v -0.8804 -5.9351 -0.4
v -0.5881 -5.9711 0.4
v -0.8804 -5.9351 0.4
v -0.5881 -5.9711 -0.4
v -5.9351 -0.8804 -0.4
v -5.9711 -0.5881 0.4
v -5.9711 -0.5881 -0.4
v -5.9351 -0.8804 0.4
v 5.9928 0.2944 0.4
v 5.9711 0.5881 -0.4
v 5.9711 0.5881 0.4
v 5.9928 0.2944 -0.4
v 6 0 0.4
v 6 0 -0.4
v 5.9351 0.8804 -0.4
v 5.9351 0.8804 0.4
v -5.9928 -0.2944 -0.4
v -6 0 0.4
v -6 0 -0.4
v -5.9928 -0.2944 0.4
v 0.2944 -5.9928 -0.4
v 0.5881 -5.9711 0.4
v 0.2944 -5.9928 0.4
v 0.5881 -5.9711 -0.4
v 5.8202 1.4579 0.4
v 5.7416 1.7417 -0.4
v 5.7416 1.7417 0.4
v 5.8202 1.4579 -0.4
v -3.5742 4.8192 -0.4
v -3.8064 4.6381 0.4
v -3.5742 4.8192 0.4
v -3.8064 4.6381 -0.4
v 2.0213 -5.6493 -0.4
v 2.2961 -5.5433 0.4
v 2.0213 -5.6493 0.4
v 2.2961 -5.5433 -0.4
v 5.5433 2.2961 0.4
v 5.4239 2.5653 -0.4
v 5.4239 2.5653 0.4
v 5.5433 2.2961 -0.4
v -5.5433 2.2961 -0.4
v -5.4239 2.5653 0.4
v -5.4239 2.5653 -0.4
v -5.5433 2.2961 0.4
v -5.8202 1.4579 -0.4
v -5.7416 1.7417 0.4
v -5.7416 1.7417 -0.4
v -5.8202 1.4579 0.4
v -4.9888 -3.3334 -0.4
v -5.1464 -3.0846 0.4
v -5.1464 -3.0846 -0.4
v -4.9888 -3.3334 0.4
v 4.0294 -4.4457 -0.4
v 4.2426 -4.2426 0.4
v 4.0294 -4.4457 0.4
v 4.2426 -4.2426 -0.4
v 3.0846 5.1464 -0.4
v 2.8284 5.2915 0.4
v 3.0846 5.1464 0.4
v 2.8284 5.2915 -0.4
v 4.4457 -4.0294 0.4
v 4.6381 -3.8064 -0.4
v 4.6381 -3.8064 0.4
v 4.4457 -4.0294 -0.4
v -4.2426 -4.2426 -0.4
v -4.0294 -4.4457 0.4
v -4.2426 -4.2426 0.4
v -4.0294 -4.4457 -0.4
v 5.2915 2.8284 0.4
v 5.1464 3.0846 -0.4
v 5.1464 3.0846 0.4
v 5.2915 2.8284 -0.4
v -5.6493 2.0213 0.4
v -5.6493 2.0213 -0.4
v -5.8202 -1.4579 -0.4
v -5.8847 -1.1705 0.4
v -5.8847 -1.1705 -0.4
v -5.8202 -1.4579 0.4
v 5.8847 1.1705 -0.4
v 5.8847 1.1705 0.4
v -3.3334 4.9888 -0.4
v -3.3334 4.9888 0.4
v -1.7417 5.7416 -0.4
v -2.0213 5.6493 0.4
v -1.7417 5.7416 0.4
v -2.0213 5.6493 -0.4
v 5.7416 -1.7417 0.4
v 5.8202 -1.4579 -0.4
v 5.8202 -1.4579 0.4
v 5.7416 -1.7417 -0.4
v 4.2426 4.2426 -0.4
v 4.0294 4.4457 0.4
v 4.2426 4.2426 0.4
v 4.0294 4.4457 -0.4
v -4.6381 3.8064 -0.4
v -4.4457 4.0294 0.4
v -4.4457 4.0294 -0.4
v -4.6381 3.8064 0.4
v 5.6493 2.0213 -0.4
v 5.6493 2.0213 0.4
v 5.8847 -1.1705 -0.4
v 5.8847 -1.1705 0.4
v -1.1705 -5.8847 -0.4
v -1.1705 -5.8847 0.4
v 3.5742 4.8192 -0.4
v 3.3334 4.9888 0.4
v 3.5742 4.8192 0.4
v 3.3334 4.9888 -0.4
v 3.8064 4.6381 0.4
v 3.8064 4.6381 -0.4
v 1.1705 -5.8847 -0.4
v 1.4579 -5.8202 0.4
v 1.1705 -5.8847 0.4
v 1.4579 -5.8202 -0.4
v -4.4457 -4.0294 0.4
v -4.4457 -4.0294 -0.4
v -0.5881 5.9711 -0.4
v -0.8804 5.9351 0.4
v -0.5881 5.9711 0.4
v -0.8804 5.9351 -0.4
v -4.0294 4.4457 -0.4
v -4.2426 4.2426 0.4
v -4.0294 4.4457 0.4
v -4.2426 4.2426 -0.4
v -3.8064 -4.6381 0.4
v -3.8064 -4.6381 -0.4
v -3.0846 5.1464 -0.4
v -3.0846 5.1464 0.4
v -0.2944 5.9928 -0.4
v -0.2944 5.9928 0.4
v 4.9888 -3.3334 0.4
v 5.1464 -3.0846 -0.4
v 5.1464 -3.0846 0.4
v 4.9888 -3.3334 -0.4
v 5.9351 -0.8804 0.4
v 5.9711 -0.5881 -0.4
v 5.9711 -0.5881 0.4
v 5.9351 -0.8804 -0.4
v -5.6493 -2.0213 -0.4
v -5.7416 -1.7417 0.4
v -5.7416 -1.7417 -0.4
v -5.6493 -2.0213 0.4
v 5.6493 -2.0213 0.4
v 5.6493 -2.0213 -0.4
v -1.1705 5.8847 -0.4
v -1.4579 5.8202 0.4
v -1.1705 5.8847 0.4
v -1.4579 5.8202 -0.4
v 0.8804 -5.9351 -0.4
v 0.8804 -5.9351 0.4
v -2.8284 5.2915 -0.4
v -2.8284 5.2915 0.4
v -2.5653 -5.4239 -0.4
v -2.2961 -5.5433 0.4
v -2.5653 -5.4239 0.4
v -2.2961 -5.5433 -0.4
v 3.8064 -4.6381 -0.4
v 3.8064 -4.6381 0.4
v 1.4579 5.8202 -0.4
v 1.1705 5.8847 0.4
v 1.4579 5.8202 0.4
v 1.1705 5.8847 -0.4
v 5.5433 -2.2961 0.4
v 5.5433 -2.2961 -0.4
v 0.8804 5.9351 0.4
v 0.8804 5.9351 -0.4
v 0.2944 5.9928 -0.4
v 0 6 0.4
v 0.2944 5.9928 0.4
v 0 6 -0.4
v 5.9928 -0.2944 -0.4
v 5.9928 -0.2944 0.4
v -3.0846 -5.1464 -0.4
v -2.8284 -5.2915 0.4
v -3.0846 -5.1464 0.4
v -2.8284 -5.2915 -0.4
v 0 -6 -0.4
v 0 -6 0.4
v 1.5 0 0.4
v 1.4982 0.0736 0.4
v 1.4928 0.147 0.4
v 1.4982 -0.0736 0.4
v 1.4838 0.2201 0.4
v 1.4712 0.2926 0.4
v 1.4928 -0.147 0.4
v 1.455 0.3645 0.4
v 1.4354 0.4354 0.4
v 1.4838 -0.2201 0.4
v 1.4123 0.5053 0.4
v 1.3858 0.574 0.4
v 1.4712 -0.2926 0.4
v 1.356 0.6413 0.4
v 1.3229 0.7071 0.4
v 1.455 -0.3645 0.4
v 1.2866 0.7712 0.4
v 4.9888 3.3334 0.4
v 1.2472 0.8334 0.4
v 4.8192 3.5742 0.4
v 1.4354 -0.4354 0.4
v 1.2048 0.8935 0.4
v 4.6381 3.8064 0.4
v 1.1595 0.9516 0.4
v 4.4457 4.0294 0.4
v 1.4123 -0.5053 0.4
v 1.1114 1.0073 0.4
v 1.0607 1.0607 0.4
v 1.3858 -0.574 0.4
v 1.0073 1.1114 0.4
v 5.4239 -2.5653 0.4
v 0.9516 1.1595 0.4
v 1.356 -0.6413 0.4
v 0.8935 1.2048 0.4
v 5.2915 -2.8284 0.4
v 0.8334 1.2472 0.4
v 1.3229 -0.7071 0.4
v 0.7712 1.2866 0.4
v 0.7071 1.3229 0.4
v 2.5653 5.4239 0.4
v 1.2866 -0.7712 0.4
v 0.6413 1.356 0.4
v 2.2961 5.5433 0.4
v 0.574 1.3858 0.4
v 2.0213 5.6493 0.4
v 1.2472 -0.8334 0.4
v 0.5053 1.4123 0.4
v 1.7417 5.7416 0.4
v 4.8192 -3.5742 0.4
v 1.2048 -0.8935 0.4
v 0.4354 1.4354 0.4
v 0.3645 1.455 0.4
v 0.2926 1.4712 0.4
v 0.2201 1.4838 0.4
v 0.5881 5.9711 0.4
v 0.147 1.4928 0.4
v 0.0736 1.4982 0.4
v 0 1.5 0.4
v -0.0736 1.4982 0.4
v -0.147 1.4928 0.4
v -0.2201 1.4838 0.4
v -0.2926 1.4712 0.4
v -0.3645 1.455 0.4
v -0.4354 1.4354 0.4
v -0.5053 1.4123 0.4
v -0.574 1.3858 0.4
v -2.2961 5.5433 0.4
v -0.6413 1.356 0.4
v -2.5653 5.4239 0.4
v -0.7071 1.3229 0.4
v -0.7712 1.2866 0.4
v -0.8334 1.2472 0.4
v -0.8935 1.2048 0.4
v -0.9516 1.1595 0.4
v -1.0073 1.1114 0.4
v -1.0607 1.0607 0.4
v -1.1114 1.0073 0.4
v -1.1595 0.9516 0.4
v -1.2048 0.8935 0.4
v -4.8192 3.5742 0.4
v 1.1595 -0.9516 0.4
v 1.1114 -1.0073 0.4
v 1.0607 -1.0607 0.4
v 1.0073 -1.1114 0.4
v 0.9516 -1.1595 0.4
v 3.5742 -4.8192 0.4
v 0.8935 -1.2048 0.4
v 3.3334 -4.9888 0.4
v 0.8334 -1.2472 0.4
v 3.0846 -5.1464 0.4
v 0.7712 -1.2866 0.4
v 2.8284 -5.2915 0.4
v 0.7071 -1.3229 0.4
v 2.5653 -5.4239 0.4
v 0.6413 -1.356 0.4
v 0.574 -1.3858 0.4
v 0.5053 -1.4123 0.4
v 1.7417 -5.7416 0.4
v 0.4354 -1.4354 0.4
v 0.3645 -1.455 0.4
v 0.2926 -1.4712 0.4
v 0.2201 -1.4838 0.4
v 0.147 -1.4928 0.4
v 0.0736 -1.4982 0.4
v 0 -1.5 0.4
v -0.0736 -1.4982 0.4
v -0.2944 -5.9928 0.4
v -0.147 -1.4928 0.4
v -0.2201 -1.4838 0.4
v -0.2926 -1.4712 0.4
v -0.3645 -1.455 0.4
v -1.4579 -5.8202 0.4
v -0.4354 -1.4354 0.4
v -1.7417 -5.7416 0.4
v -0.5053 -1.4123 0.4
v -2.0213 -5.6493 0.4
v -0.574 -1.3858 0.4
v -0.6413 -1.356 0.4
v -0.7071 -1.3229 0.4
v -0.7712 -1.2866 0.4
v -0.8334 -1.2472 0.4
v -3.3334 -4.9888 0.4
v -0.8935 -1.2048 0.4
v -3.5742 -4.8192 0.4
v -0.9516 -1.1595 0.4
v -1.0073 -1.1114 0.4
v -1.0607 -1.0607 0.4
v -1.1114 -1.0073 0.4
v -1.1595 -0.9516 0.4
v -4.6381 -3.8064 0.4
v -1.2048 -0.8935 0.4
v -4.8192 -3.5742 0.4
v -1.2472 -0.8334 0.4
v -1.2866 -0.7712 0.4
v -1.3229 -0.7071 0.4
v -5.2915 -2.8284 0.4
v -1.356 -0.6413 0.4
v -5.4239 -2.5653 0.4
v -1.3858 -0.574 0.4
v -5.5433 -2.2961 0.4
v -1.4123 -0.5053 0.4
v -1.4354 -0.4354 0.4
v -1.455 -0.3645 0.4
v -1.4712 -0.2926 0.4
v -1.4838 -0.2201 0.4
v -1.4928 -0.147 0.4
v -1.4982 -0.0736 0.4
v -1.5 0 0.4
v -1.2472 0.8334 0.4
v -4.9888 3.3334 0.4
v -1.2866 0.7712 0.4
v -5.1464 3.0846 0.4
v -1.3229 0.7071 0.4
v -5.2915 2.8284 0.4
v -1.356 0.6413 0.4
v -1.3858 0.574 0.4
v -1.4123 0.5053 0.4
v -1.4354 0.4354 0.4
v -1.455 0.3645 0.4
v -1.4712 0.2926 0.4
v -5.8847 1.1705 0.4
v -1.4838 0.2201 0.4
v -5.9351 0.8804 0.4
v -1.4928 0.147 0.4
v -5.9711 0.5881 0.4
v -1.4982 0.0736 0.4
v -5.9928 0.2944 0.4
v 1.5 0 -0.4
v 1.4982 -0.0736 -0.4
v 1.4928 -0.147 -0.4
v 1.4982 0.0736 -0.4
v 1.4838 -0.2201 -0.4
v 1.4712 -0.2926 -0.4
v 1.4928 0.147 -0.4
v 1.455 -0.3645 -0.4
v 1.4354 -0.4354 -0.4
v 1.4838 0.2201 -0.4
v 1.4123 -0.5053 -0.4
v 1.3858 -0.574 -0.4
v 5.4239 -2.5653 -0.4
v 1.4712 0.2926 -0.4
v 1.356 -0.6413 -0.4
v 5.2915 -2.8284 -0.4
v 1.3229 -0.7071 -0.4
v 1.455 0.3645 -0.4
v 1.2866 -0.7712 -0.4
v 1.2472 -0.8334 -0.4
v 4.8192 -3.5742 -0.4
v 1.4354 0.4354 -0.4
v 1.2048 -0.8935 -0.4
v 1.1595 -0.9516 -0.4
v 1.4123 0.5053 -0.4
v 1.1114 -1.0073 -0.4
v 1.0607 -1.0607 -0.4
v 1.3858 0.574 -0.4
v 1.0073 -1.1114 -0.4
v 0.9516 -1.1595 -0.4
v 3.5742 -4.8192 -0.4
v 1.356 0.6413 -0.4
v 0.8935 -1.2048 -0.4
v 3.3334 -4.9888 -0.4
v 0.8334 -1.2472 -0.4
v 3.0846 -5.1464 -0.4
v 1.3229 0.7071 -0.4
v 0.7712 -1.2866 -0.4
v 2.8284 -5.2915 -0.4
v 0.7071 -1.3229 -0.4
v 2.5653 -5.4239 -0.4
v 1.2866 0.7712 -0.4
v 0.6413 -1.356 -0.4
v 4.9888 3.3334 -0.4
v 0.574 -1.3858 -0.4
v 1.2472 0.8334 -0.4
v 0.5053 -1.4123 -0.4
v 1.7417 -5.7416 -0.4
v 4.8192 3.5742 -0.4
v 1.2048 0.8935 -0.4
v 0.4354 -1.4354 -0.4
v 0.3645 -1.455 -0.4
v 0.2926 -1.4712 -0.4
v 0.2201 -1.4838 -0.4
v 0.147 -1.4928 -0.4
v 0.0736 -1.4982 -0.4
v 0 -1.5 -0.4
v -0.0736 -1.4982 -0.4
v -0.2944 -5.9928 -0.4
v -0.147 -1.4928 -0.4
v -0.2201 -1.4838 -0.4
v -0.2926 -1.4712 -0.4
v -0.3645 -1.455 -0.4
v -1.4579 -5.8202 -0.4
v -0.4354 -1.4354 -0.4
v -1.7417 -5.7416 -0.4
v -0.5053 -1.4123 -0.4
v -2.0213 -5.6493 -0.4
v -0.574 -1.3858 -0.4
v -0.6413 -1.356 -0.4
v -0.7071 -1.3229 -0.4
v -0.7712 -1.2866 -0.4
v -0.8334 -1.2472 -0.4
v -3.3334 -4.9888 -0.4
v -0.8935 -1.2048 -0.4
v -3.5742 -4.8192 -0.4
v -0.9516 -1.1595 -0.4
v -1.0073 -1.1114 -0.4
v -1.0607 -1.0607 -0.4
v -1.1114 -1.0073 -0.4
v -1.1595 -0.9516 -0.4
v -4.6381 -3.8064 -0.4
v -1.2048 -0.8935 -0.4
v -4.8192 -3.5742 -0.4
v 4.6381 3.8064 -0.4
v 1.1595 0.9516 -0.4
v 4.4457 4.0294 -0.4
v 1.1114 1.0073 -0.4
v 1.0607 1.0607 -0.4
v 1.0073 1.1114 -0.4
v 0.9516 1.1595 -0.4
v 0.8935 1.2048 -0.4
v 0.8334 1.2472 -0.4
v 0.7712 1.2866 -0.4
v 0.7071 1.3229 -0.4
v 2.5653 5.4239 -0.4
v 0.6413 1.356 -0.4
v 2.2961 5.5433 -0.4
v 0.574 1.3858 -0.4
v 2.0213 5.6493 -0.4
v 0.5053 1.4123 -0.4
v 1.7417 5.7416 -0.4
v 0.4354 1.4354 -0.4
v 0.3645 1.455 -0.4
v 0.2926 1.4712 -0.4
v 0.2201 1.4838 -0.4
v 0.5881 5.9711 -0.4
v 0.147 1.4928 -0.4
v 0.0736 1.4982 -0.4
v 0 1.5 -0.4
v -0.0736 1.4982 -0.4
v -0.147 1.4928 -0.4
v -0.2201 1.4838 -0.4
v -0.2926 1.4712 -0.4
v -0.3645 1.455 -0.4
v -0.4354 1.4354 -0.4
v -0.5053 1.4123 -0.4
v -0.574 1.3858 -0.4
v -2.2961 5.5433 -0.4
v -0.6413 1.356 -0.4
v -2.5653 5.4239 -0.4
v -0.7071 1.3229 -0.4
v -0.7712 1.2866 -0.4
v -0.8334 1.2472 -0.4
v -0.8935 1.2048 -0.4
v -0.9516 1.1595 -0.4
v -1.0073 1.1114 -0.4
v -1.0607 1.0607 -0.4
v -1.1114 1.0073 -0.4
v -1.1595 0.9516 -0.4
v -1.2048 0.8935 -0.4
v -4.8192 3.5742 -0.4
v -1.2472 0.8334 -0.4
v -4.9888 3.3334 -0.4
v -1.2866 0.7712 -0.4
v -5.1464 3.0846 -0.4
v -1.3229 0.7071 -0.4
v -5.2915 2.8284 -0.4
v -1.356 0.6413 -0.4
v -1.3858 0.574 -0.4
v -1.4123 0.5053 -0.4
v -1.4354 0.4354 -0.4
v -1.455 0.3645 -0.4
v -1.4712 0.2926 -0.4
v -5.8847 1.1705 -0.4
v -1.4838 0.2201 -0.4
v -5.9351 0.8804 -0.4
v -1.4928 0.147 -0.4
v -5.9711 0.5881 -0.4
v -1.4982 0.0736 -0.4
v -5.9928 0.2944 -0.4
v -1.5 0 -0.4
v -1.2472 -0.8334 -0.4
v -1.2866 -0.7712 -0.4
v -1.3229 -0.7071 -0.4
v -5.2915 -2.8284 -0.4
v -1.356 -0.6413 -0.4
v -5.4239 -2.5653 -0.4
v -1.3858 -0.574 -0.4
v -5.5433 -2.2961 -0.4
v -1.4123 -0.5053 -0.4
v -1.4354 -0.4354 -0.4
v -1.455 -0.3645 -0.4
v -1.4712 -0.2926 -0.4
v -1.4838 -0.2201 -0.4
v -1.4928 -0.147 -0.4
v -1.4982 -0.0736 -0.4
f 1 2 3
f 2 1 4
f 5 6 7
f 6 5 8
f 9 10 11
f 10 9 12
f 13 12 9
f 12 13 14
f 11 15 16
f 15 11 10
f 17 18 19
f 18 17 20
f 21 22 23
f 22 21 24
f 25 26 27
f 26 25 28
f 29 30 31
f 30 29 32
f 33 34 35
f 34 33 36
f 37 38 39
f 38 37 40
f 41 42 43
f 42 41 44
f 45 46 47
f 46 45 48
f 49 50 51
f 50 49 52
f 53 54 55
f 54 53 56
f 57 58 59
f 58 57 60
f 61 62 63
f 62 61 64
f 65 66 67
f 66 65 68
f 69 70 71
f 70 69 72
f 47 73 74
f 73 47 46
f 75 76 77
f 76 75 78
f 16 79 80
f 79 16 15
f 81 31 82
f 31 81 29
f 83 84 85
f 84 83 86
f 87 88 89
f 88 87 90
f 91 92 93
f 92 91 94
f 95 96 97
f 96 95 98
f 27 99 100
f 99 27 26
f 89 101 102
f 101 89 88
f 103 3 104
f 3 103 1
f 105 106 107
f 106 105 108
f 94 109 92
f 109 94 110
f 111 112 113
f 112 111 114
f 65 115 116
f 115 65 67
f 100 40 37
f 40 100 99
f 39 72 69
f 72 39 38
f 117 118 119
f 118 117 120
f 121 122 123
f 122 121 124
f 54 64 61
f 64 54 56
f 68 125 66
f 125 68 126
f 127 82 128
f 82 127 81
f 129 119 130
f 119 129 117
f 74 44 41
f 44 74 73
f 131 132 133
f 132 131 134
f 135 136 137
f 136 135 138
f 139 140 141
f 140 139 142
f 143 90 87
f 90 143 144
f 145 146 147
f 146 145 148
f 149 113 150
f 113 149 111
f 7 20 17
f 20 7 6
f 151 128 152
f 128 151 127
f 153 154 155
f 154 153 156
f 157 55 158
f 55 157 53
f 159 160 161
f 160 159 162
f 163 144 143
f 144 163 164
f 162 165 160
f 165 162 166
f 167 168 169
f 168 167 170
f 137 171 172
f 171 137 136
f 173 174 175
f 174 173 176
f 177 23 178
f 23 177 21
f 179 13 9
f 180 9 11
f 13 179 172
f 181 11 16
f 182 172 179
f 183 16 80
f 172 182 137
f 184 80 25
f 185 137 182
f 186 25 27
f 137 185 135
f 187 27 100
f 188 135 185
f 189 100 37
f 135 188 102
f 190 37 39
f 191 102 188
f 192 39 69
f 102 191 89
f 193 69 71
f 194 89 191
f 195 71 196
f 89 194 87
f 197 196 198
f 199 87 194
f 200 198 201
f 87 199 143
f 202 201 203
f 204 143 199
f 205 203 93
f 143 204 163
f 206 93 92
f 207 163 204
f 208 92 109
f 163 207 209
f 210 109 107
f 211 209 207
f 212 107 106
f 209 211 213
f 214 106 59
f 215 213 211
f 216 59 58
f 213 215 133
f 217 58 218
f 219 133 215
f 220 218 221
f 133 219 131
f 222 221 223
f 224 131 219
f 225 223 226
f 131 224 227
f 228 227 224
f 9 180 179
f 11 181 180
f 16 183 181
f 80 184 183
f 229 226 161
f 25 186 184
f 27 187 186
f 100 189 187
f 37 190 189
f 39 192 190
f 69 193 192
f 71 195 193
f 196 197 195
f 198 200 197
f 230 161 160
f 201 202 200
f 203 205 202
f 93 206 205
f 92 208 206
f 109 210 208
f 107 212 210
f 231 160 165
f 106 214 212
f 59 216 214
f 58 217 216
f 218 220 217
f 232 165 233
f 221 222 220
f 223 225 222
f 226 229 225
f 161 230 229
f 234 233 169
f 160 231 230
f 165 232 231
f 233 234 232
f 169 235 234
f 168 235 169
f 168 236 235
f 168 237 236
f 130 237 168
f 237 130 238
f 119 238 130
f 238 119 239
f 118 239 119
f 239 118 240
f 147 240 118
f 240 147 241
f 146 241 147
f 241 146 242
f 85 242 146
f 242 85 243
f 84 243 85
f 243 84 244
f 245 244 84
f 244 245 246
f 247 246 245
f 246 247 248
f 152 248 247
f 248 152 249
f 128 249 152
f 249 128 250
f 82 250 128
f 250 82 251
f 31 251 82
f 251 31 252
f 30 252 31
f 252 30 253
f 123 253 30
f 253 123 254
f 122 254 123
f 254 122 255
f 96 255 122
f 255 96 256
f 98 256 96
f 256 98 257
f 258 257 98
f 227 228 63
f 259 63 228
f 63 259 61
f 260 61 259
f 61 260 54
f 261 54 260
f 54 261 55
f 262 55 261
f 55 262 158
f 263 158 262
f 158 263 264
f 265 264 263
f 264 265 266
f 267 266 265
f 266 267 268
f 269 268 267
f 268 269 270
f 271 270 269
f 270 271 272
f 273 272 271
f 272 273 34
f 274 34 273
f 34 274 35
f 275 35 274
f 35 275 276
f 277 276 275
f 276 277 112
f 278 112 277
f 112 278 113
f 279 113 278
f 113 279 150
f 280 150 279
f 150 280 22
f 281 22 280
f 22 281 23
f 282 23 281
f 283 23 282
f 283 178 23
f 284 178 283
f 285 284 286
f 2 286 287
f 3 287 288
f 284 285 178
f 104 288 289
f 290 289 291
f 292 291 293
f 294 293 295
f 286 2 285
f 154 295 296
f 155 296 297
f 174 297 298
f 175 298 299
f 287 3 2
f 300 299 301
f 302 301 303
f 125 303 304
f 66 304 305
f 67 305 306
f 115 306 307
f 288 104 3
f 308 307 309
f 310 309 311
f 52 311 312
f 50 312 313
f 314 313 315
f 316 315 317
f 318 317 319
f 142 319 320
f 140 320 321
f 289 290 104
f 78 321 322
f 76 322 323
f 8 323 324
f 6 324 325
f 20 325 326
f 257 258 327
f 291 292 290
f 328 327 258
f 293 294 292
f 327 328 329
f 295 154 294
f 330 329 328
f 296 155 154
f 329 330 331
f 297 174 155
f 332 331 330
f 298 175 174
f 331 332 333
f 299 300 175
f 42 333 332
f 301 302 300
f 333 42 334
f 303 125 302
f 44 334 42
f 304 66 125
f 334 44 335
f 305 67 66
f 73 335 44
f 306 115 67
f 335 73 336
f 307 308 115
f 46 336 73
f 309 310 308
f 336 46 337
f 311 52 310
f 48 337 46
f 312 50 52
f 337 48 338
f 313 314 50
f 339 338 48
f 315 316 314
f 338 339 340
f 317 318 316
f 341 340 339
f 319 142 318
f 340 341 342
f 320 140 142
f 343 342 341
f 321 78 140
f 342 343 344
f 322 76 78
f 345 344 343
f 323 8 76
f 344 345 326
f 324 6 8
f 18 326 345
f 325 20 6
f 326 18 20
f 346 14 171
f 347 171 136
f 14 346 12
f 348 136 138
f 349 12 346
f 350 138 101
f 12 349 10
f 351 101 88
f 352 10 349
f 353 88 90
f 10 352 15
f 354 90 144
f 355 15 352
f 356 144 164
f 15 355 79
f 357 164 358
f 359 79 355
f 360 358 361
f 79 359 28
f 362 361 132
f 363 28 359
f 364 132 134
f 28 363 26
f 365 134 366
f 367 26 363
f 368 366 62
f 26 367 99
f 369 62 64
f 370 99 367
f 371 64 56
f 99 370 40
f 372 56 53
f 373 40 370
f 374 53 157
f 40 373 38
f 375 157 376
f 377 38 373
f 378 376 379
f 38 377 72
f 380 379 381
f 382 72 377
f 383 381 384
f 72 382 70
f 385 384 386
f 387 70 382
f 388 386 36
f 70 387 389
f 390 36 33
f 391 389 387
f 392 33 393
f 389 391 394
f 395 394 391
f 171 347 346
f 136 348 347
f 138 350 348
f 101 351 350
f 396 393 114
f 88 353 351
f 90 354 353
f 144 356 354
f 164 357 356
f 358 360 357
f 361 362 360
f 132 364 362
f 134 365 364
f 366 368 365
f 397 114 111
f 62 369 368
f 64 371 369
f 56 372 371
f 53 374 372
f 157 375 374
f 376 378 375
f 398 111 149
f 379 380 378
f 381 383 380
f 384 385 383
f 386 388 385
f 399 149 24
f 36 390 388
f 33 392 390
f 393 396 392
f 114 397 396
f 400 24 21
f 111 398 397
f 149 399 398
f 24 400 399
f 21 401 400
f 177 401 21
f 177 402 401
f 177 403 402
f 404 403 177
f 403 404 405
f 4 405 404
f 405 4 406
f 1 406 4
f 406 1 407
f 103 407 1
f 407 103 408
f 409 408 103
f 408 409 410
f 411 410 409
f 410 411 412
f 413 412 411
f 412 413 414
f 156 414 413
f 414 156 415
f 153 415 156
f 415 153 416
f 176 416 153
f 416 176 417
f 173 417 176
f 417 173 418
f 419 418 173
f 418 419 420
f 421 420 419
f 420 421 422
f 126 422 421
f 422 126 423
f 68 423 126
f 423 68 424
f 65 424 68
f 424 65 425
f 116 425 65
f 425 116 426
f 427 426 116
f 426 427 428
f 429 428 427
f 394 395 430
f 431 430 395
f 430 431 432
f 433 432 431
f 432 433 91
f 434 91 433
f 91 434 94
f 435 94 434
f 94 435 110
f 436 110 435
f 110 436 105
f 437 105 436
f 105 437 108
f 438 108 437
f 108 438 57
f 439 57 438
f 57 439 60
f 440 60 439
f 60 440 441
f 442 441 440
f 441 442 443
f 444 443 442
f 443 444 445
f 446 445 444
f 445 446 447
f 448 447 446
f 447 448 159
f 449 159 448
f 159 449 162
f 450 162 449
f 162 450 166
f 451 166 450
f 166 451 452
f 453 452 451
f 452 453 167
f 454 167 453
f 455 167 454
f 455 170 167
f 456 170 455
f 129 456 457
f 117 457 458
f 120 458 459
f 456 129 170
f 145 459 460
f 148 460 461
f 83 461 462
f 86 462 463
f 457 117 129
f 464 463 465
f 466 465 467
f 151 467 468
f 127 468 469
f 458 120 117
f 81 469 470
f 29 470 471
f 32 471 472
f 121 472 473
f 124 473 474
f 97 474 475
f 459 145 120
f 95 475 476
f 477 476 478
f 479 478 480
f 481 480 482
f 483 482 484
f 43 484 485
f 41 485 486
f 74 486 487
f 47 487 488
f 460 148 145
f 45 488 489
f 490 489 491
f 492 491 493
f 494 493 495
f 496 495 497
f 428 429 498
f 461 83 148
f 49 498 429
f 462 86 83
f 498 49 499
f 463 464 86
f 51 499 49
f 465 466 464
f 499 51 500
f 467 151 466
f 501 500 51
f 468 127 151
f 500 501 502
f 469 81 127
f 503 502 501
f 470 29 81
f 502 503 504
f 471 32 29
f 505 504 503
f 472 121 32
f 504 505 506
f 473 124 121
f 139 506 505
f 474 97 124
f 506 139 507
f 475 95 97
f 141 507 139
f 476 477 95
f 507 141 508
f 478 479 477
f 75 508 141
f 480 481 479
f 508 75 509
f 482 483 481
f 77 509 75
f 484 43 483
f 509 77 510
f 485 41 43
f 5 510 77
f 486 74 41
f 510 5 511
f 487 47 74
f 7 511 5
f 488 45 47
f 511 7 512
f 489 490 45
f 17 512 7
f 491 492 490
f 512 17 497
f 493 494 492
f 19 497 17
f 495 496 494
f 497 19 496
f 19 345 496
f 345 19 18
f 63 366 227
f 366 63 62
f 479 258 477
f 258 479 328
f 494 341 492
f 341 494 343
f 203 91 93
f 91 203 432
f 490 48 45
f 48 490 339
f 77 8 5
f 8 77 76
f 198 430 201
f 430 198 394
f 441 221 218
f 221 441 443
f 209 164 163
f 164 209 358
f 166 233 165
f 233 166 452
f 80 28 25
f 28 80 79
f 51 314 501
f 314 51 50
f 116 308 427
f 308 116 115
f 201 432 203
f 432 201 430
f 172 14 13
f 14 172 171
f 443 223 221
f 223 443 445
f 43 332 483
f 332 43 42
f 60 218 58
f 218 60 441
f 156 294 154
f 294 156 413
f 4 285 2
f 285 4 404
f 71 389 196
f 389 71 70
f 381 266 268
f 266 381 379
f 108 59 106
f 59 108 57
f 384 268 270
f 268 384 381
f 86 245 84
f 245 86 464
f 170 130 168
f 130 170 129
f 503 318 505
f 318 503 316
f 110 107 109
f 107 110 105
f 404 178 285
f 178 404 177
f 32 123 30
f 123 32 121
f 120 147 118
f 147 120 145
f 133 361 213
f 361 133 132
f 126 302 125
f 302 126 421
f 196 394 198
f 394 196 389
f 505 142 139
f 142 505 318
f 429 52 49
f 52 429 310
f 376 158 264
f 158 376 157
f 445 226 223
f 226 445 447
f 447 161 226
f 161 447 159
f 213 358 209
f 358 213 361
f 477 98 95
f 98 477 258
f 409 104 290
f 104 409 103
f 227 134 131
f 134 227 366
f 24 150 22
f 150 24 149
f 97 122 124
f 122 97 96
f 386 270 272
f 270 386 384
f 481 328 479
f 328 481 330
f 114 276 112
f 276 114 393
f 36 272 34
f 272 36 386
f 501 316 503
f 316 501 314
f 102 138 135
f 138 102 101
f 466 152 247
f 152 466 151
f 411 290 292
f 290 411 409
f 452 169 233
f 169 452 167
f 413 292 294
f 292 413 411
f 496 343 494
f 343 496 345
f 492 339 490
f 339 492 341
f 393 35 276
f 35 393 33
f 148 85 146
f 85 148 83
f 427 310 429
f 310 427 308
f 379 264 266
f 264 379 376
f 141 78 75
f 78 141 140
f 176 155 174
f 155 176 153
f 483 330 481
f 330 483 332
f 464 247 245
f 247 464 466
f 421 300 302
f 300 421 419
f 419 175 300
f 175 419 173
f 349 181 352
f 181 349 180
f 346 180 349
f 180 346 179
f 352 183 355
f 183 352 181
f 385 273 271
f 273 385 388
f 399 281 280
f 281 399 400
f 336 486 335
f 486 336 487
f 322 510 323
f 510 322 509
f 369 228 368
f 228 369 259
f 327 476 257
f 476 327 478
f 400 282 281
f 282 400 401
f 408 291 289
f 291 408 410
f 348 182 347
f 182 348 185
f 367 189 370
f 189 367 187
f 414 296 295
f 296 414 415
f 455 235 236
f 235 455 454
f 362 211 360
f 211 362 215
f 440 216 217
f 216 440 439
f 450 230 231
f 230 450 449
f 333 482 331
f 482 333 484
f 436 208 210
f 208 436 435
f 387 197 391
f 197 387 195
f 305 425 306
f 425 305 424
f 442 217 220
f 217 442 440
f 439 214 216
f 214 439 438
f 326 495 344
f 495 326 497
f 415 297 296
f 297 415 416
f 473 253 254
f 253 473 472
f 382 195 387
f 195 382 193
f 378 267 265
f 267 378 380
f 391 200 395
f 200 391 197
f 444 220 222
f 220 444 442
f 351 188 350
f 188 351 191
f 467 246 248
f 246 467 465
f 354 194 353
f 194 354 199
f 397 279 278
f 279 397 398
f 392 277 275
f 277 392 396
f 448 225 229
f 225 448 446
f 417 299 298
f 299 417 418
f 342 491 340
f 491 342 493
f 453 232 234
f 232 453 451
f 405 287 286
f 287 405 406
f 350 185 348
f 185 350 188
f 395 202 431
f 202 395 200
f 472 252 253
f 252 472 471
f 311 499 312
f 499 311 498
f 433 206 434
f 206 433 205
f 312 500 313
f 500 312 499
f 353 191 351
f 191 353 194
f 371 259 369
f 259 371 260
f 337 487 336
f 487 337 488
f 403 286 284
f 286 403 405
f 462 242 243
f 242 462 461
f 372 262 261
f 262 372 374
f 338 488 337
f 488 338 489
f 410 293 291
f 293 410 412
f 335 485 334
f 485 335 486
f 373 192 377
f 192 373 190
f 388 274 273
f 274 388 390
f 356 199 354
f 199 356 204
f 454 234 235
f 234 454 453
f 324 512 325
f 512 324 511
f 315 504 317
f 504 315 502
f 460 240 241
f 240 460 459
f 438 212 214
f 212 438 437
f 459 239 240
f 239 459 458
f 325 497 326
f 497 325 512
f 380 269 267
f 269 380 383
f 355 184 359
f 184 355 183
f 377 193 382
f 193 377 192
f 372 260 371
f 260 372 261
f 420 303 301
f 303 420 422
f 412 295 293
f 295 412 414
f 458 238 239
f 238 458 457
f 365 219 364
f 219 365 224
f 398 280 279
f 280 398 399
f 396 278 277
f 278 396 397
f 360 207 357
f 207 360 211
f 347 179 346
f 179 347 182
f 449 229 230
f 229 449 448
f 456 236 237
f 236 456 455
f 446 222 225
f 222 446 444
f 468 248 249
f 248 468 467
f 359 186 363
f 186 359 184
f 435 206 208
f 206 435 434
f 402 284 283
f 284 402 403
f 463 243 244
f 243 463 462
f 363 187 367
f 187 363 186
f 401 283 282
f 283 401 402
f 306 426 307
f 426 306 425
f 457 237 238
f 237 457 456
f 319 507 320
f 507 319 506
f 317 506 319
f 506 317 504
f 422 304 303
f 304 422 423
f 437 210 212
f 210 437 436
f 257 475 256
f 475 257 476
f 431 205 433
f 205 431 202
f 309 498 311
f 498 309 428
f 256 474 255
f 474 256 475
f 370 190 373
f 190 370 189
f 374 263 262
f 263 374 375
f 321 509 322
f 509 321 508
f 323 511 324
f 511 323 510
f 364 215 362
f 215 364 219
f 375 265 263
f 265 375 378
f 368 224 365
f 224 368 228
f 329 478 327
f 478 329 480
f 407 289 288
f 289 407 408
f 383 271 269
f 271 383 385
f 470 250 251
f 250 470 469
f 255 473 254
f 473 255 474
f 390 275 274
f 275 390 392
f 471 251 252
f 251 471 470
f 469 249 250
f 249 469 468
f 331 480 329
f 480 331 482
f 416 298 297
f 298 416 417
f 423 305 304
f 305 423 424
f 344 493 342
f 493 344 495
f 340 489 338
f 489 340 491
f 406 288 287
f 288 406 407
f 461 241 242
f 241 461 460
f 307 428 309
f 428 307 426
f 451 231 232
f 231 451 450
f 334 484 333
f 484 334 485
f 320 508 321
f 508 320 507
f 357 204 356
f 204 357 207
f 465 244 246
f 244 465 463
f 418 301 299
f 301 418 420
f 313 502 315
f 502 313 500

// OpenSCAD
// Penny washer parameters (mm)
inner_diameter_mm = 3.0;   //[1.5:6.0:0.1]
outer_diameter_mm = 12.0;  //[6.0:24.0:0.1]
thickness_mm      = 0.8;   //[0.4:1.6:0.05]
eps_mm            = 0.2;   //[0.05:0.5:0.05]

$fn = 128;

// Single connected solid: one washer with a through-hole
module penny_washer(inner_d=inner_diameter_mm, outer_d=outer_diameter_mm, t=thickness_mm, eps=eps_mm) {
    difference() {
        cylinder(d=outer_d, h=t, center=true);
        cylinder(d=inner_d, h=t + 2*eps, center=true);
    }
}

penny_washer();
